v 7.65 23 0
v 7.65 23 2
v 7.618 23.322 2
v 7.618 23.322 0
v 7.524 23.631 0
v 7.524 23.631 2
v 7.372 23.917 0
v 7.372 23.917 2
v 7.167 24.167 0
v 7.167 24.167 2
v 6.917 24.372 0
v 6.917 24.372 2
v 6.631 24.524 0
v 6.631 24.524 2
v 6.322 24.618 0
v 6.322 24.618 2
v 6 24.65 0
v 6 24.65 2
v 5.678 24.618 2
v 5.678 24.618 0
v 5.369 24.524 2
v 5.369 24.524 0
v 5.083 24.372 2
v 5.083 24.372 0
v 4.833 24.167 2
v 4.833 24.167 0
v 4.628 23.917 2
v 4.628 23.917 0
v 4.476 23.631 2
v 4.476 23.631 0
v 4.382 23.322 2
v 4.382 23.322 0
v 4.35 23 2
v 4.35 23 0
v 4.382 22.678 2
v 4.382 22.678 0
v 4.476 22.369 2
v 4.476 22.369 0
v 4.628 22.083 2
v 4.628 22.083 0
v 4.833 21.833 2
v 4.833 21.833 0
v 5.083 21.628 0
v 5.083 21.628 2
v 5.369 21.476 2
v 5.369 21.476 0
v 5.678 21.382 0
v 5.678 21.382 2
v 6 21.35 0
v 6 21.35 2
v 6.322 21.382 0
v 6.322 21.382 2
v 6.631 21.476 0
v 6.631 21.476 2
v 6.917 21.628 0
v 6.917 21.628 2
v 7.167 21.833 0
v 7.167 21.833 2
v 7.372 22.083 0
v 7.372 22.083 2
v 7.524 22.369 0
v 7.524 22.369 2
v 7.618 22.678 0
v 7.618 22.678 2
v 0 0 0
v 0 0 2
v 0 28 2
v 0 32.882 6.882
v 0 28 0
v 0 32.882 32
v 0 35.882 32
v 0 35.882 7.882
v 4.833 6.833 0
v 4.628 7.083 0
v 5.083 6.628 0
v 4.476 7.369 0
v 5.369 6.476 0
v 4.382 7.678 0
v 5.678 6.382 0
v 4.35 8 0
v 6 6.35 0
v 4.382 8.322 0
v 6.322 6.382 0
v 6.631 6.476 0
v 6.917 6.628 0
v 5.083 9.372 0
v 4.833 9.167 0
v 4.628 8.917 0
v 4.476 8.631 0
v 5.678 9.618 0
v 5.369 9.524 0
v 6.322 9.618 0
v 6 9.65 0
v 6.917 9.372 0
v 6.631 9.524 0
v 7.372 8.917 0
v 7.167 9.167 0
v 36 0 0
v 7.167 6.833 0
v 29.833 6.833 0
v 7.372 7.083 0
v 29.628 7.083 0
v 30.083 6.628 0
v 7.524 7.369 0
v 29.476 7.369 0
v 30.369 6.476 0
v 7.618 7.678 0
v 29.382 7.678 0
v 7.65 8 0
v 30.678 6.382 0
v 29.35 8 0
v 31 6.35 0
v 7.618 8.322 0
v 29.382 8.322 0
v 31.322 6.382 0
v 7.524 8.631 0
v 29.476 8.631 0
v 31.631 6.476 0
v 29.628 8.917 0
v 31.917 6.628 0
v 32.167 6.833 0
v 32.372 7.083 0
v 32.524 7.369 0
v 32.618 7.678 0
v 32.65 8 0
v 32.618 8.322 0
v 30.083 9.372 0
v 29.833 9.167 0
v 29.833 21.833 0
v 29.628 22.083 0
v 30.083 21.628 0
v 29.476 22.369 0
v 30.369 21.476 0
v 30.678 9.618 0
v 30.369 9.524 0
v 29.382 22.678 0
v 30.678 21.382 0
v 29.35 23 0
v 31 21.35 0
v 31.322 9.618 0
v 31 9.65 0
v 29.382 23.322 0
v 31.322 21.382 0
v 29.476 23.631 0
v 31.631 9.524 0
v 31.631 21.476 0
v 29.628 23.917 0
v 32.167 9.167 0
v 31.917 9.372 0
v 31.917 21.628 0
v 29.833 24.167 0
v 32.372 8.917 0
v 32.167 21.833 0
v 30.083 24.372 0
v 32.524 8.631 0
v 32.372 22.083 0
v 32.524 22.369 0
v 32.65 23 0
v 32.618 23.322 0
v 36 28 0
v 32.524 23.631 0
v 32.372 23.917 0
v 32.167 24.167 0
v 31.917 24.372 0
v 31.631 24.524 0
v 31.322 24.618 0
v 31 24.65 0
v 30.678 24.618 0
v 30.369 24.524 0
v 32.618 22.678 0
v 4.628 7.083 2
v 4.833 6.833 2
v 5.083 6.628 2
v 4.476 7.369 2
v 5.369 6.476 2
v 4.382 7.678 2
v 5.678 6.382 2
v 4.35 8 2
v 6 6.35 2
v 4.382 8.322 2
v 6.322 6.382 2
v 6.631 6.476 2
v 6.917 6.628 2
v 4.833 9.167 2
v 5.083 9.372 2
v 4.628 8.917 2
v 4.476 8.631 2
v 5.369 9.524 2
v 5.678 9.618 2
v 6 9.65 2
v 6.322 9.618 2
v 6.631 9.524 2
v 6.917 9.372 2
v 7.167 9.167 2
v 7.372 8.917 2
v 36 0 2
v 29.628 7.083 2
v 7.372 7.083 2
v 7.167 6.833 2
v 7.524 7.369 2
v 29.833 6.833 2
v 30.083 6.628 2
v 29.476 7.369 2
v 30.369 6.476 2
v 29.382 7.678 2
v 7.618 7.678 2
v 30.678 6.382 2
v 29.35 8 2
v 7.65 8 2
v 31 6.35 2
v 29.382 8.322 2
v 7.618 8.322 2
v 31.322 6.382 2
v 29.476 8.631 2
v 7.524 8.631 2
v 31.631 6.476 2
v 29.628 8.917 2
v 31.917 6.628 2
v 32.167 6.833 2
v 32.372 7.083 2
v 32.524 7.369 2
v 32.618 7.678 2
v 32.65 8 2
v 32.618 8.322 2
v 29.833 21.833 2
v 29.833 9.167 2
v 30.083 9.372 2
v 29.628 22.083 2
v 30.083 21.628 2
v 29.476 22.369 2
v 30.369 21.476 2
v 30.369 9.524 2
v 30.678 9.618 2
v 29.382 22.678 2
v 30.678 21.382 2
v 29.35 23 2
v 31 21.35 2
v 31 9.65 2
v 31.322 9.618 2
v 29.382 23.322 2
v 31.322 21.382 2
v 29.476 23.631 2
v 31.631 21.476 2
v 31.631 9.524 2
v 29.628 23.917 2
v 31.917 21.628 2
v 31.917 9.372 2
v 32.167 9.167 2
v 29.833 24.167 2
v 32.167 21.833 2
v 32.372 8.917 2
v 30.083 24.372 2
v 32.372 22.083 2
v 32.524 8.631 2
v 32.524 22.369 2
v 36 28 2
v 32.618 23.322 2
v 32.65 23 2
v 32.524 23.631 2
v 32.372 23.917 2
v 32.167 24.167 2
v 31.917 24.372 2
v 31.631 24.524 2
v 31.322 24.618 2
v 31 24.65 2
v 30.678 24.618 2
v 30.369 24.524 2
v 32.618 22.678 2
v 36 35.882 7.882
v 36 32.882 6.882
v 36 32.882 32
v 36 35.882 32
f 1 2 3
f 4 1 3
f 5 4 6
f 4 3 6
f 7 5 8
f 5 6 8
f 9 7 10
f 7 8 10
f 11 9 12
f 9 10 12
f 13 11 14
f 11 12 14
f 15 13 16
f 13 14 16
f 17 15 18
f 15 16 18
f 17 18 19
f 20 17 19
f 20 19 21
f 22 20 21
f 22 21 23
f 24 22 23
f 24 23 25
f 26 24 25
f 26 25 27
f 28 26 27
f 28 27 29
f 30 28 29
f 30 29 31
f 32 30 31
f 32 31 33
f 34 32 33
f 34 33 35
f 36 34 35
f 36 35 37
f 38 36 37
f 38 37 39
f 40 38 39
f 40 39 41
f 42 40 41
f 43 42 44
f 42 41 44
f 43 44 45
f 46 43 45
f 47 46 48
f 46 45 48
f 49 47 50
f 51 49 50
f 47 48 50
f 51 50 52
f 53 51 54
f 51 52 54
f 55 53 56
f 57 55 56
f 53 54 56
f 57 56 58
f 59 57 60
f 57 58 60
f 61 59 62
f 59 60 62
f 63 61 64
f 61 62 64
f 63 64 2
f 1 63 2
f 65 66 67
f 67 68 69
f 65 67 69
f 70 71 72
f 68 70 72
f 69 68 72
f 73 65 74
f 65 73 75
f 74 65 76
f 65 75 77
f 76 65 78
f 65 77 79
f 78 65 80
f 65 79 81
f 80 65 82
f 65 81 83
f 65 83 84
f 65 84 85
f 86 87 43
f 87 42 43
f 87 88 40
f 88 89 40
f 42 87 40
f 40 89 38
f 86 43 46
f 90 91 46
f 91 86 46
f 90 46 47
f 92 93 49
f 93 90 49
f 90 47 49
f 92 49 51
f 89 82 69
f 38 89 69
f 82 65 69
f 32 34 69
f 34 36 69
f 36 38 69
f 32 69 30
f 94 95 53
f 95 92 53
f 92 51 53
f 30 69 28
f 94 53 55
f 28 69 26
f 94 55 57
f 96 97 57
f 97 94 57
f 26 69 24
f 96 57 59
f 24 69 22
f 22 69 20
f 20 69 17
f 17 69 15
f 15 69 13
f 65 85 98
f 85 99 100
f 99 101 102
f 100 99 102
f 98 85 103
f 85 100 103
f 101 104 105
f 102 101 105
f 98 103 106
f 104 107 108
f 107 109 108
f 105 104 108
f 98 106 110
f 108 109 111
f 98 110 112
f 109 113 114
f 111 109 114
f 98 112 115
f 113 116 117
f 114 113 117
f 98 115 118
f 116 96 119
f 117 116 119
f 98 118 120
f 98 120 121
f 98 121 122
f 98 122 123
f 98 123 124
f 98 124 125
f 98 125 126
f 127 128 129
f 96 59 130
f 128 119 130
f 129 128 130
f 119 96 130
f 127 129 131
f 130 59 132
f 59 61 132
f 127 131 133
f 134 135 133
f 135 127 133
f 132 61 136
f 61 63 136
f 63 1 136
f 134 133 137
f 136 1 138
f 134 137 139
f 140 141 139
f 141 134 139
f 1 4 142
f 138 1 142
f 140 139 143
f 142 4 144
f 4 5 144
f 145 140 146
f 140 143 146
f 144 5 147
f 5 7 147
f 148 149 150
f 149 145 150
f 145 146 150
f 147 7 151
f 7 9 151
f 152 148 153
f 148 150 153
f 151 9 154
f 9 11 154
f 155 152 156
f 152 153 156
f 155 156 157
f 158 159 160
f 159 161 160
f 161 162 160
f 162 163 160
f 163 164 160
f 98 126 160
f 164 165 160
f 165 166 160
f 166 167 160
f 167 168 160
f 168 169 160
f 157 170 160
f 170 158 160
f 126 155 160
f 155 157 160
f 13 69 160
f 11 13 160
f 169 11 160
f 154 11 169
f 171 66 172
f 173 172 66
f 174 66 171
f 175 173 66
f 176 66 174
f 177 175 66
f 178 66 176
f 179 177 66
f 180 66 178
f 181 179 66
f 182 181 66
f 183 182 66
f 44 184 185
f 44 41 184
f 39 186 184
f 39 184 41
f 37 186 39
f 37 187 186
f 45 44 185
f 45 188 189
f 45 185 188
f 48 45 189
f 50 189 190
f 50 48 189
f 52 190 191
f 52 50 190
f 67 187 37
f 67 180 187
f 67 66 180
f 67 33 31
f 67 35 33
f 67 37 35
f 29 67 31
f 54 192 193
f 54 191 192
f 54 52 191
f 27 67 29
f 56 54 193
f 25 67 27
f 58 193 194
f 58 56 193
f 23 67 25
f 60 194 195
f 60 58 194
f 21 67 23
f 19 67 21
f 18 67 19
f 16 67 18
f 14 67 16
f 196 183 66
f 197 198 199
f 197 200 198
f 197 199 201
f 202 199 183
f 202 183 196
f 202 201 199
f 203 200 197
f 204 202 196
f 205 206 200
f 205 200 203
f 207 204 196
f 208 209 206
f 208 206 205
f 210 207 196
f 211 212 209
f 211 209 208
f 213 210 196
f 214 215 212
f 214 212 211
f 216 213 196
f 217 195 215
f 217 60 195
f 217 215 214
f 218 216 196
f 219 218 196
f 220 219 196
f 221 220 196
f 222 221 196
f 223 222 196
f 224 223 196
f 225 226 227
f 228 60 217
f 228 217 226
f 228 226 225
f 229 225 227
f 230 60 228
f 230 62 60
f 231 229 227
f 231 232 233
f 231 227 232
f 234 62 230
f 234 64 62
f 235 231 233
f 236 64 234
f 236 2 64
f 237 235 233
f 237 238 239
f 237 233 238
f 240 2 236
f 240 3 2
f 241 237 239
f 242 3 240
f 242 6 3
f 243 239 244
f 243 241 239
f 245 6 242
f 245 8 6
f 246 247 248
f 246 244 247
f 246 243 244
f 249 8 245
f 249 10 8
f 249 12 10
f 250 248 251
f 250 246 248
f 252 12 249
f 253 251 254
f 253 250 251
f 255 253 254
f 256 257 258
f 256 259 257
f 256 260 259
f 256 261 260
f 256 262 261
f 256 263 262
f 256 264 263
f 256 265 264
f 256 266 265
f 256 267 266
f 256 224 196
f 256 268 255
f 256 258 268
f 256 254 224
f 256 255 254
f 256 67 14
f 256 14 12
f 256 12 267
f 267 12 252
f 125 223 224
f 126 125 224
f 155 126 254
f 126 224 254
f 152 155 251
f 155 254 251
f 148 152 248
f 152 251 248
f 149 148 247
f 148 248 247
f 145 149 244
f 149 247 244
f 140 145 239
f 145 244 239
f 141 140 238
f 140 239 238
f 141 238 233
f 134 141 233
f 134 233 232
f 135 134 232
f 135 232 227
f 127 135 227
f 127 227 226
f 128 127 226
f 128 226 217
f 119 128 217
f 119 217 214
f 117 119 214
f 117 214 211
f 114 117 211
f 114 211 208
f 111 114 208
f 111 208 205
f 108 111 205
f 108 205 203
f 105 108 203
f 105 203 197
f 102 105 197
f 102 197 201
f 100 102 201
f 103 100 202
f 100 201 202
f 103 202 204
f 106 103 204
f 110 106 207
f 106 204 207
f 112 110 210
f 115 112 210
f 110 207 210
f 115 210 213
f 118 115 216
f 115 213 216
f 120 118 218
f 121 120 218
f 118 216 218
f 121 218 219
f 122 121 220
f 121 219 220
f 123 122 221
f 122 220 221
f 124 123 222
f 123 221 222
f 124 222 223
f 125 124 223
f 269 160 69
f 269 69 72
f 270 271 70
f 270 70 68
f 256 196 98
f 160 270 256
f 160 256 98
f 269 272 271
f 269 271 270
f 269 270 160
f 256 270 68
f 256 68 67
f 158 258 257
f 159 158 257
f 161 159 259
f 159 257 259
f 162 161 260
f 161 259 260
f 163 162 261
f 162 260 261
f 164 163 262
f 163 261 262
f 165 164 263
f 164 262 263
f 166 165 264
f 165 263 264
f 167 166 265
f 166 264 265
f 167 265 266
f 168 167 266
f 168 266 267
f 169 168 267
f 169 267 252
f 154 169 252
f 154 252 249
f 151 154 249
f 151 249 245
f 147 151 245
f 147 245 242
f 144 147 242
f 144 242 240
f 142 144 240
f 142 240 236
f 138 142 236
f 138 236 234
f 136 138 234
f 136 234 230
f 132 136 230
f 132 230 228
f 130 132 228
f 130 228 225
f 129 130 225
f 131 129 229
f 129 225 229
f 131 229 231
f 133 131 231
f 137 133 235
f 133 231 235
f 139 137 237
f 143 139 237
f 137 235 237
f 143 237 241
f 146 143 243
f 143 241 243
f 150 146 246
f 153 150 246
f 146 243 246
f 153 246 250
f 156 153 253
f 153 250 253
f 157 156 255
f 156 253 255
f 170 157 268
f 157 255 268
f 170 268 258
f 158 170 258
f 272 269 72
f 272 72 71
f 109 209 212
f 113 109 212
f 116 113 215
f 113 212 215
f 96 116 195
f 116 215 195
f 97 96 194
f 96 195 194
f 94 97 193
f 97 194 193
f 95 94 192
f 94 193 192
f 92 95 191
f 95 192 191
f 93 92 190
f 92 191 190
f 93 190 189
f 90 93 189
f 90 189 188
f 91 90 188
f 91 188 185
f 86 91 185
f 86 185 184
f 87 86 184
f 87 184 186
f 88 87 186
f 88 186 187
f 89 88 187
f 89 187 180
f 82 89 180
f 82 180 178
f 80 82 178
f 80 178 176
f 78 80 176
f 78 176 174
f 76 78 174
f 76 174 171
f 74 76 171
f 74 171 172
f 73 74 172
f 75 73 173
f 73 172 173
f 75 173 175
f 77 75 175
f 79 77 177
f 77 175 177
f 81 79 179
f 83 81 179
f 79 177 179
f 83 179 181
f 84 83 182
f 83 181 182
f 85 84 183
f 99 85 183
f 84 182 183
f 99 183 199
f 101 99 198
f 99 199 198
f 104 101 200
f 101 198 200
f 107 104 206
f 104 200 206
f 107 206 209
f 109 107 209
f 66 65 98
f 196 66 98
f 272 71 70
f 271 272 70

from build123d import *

# Parameters (mm, degrees)
SKETCH_1_W          = 36
SKETCH_1_H          = 28
EXTRUDE_1_DEPTH     = 2
EXTRUDE_2_DEPTH     = 36
SKETCH_3_R          = 1.65
CUT_EXTRUDE_1_DEPTH = 4


with BuildPart() as part:
    # 草图1 → 凸台-拉伸1 (new body)
    with BuildSketch(Plane.XY):
        with Locations((18, 14)):
            Rectangle(SKETCH_1_W, SKETCH_1_H)
    extrude(amount=EXTRUDE_1_DEPTH)

    # 草图2 → 凸台-拉伸2 (add)
    with BuildSketch(Plane(origin=(36, 0, 0), x_dir=(0, 0, -1), z_dir=(1, 0, 0))):
        Polygon((-6.882121938, 32.882121938), (-2, 28), (0, 28), (-7.882121938, 35.882121938), (-32, 35.882121938), (-32, 32.882121938), align=None)
    extrude(amount=-EXTRUDE_2_DEPTH)

    # 草图3 → 切除-拉伸1 (cut)
    with BuildSketch(Plane.XY.offset(2)):
        with Locations((31, 23)):
            Circle(SKETCH_3_R)
        with Locations((6, 23)):
            Circle(SKETCH_3_R)
        with Locations((6, 8)):
            Circle(SKETCH_3_R)
        with Locations((31, 8)):
            Circle(SKETCH_3_R)
    extrude(amount=-CUT_EXTRUDE_1_DEPTH, mode=Mode.SUBTRACT)


solid = part.part
